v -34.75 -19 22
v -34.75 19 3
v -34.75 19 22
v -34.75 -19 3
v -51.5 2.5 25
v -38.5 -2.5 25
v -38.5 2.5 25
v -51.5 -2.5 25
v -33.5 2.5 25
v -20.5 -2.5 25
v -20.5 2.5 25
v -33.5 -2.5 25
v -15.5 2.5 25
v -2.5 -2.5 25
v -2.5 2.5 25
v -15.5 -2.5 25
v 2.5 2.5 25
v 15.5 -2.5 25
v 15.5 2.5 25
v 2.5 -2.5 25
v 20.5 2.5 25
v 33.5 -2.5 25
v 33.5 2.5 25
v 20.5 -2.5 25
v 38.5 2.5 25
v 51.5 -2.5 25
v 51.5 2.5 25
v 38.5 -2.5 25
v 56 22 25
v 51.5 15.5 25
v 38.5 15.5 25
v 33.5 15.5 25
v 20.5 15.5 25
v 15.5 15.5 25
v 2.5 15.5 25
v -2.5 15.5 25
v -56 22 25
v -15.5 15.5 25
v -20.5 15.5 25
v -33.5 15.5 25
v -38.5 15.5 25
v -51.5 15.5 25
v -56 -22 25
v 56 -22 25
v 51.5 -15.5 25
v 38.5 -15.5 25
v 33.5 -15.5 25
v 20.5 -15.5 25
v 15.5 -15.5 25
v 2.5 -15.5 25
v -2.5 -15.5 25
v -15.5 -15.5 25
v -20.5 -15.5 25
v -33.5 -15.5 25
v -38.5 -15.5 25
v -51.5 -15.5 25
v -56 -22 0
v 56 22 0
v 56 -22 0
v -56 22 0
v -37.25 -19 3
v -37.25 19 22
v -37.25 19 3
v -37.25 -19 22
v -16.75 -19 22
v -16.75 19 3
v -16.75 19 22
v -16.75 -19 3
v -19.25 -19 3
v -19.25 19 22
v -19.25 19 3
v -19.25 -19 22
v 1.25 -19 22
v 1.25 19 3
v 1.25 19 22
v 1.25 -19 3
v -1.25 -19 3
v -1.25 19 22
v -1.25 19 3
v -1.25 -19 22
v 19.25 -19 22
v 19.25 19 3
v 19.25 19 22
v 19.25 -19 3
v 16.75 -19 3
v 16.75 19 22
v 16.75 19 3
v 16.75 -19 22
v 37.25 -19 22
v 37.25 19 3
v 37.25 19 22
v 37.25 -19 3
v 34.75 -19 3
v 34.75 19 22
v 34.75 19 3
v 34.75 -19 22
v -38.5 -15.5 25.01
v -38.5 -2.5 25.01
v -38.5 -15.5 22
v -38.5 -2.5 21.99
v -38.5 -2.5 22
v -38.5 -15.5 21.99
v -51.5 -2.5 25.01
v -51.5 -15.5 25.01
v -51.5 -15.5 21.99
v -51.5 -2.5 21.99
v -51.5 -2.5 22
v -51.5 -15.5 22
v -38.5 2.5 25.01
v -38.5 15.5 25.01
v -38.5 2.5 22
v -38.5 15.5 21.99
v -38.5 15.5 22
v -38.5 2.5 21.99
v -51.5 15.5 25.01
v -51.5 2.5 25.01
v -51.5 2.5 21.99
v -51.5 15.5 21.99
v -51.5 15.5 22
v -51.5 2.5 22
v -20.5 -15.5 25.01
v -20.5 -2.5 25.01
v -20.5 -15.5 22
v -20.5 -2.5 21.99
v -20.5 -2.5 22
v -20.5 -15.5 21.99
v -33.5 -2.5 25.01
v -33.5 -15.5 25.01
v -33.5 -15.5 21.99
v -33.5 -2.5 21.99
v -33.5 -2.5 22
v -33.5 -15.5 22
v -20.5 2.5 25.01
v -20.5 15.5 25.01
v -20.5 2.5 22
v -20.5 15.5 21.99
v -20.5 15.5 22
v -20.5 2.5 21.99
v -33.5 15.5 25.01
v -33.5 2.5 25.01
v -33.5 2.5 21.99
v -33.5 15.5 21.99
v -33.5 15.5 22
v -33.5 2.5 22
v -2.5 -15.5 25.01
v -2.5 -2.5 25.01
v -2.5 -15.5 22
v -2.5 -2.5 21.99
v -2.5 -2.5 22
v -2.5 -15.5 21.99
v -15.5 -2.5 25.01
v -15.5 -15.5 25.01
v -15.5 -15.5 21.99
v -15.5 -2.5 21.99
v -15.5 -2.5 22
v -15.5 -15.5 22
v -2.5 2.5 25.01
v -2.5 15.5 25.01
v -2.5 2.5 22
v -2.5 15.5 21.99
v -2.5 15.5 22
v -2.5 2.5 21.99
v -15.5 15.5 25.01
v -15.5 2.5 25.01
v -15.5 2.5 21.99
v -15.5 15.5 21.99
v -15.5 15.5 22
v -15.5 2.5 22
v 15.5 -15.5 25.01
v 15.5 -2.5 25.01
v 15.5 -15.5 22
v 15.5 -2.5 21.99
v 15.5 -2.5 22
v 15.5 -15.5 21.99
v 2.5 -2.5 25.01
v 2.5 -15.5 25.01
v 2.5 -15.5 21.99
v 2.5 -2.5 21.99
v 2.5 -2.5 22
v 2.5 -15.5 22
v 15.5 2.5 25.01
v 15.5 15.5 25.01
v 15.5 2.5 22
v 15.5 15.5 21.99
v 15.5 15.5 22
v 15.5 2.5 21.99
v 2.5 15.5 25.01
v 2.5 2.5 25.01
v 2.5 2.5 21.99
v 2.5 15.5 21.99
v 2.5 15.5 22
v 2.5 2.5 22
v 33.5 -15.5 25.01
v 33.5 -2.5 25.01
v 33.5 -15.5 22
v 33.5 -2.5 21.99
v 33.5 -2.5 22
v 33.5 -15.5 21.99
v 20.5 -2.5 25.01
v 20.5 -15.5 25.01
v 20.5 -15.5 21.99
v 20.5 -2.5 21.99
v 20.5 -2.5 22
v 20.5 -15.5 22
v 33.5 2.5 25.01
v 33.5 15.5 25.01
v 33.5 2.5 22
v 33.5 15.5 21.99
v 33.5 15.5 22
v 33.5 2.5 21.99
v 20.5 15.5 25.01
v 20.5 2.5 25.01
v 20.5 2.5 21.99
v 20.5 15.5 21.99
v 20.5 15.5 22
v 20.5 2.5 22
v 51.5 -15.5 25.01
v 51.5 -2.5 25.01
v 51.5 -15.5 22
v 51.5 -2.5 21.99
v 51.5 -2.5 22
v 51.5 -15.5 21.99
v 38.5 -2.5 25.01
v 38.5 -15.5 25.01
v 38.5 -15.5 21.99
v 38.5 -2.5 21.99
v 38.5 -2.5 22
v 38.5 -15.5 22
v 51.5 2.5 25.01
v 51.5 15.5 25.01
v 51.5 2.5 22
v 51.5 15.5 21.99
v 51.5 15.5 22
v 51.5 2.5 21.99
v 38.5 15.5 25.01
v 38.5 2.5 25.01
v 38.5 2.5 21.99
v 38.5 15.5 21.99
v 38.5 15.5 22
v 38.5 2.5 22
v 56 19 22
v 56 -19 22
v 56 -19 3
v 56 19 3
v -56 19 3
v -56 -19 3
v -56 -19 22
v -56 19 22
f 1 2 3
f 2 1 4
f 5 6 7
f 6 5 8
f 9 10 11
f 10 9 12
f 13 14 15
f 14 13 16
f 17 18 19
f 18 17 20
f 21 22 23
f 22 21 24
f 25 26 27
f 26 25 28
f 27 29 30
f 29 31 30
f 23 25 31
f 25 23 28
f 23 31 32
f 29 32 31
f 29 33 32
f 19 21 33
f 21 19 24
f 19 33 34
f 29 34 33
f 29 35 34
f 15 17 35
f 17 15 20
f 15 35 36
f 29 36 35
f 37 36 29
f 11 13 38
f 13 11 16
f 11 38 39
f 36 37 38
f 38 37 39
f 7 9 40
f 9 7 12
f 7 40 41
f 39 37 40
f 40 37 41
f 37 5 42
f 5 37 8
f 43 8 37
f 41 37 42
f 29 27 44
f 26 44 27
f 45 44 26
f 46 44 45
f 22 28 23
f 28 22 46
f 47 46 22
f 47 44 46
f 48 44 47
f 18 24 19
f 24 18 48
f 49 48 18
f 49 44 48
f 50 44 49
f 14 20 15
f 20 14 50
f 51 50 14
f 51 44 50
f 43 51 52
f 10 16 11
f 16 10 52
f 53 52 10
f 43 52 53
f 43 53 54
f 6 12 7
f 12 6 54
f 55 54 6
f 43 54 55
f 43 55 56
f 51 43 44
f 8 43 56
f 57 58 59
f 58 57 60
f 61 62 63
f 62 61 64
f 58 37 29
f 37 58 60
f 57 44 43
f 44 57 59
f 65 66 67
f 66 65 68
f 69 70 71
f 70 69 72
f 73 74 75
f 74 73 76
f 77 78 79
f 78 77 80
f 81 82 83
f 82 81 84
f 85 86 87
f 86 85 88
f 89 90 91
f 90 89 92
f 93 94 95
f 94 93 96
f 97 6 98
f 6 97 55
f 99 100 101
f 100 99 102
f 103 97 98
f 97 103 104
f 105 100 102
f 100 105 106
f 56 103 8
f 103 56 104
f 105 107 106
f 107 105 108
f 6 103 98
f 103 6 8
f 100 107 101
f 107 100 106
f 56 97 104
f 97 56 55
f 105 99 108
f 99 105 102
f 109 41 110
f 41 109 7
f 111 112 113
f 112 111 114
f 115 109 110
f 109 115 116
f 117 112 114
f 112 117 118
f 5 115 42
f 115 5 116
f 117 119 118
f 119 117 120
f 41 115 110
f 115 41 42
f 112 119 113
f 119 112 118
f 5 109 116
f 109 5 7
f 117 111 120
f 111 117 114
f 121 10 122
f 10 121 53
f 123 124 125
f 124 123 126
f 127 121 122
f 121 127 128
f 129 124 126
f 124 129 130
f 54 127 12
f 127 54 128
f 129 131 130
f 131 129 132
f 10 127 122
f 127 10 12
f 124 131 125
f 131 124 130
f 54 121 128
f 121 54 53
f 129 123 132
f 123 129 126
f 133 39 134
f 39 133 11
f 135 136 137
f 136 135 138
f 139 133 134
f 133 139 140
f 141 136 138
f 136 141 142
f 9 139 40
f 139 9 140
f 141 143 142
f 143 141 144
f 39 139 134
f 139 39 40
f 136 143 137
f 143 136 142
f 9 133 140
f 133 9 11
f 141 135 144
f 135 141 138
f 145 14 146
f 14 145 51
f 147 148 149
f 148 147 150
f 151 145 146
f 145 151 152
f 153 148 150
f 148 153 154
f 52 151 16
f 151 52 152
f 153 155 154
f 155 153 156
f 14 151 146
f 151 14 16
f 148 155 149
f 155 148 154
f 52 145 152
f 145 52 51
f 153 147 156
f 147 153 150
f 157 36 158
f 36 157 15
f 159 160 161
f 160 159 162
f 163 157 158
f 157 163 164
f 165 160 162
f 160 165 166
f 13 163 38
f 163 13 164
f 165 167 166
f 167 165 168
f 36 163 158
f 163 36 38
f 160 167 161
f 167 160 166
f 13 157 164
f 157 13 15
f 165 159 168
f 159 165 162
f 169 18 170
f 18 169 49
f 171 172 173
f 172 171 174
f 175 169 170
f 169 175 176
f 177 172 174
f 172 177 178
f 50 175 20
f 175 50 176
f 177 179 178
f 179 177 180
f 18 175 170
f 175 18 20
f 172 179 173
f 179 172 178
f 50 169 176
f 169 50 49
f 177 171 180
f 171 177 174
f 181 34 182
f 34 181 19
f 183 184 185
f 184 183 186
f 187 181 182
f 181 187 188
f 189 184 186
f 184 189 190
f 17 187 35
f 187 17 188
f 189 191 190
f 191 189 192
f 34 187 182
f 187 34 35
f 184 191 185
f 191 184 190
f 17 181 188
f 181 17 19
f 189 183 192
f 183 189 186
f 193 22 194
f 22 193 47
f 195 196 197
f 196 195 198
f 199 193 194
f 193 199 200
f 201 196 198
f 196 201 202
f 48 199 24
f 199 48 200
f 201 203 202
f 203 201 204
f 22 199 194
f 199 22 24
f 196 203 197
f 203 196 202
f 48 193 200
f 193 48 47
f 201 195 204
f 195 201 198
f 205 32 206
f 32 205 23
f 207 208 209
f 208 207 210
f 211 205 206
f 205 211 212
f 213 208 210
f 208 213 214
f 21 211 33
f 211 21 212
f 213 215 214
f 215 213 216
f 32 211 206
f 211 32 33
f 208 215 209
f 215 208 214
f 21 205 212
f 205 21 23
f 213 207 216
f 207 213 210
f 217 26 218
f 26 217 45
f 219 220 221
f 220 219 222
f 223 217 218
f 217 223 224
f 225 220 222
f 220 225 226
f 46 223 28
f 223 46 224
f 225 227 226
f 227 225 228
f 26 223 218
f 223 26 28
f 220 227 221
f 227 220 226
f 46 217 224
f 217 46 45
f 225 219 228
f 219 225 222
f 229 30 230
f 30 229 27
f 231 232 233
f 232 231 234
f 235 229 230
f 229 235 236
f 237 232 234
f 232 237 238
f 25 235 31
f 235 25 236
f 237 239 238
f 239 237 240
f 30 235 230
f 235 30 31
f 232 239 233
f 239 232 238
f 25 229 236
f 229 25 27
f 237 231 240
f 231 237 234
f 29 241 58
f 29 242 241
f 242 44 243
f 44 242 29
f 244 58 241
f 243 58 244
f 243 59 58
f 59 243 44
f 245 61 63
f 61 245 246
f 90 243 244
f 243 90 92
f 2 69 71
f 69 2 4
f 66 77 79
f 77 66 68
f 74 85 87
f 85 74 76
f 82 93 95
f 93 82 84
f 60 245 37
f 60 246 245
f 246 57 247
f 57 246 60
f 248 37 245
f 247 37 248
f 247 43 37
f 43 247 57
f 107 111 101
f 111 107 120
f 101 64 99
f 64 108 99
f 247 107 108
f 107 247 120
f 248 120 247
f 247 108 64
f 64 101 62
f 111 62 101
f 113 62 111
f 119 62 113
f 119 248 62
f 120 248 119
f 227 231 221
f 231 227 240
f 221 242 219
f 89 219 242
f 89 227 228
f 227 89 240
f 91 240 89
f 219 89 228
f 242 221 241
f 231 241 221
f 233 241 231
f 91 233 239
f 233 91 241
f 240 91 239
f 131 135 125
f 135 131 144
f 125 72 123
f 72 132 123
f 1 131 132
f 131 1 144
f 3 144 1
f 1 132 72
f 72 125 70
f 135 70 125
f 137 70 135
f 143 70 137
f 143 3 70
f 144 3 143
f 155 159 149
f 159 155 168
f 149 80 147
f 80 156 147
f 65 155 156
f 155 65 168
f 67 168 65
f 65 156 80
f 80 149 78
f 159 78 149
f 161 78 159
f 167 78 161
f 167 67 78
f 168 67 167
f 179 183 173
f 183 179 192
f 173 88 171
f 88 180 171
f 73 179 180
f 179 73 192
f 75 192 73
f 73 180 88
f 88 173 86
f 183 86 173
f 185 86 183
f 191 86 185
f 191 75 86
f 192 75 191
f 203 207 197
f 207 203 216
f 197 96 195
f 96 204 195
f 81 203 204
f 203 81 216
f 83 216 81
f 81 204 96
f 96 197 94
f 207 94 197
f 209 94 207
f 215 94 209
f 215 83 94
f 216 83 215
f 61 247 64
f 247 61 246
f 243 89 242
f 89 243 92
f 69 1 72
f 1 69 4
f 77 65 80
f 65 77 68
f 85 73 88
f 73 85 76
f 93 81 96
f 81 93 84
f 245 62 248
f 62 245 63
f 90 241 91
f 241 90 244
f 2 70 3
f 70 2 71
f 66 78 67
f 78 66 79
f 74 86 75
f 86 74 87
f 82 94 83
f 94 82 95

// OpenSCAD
// Dimensions (mm)
base_x = 112;
base_y = 44;
base_z = 3;
deck_z_start = 22;
deck_z_end = 25;
deck_thickness = deck_z_end - deck_z_start;
wall_end_thickness = 3;
wall_rib_thickness = 2.5;
wall_depth = base_y;
wall_height = 25;
rib_positions = [-36, -18, 0, 18, 36];
hole_size = 13;
hole_spacing_x = 18;
hole_spacing_y = 18;
$fn = 64;

// Base plate: rests on bed at z=0, extends to z=3
translate([0, 0, base_z / 2])
  cube([base_x, base_y, base_z], center = true);

// Deck plate: from z=22 to z=25
translate([0, 0, deck_z_start + deck_thickness / 2])
  cube([base_x, base_y, deck_thickness], center = true);

// End walls (flush with short ends, i.e., at y = +/- base_y/2)
// Left end wall
translate([0, -base_y / 2 + wall_end_thickness / 2, wall_height / 2])
  cube([base_x, wall_end_thickness, wall_height], center = true);

// Right end wall
translate([0, base_y / 2 - wall_end_thickness / 2, wall_height / 2])
  cube([base_x, wall_end_thickness, wall_height], center = true);

// Five ribs
for (x = rib_positions) {
  translate([x, 0, wall_height / 2])
    cube([wall_rib_thickness, wall_depth, wall_height], center = true);
}

// 12 square through-holes in deck: 2 rows (Y) x 6 columns (X)
// Centred on deck, spacing 18 mm
// X positions: -45, -27, -9, 9, 27, 45 (since 6 holes * 18 = 108 span, centred)
// Y positions: -9, 9 (since 2 holes * 18 = 36 span, centred)
hole_x_positions = [-45, -27, -9, 9, 27, 45];
hole_y_positions = [-9, 9];

for (hx = hole_x_positions) {
  for (hy = hole_y_positions) {
    translate([hx, hy, deck_z_start + deck_thickness / 2])
      cube([hole_size, hole_size, deck_thickness + 0.02], center = true);
  }
}
